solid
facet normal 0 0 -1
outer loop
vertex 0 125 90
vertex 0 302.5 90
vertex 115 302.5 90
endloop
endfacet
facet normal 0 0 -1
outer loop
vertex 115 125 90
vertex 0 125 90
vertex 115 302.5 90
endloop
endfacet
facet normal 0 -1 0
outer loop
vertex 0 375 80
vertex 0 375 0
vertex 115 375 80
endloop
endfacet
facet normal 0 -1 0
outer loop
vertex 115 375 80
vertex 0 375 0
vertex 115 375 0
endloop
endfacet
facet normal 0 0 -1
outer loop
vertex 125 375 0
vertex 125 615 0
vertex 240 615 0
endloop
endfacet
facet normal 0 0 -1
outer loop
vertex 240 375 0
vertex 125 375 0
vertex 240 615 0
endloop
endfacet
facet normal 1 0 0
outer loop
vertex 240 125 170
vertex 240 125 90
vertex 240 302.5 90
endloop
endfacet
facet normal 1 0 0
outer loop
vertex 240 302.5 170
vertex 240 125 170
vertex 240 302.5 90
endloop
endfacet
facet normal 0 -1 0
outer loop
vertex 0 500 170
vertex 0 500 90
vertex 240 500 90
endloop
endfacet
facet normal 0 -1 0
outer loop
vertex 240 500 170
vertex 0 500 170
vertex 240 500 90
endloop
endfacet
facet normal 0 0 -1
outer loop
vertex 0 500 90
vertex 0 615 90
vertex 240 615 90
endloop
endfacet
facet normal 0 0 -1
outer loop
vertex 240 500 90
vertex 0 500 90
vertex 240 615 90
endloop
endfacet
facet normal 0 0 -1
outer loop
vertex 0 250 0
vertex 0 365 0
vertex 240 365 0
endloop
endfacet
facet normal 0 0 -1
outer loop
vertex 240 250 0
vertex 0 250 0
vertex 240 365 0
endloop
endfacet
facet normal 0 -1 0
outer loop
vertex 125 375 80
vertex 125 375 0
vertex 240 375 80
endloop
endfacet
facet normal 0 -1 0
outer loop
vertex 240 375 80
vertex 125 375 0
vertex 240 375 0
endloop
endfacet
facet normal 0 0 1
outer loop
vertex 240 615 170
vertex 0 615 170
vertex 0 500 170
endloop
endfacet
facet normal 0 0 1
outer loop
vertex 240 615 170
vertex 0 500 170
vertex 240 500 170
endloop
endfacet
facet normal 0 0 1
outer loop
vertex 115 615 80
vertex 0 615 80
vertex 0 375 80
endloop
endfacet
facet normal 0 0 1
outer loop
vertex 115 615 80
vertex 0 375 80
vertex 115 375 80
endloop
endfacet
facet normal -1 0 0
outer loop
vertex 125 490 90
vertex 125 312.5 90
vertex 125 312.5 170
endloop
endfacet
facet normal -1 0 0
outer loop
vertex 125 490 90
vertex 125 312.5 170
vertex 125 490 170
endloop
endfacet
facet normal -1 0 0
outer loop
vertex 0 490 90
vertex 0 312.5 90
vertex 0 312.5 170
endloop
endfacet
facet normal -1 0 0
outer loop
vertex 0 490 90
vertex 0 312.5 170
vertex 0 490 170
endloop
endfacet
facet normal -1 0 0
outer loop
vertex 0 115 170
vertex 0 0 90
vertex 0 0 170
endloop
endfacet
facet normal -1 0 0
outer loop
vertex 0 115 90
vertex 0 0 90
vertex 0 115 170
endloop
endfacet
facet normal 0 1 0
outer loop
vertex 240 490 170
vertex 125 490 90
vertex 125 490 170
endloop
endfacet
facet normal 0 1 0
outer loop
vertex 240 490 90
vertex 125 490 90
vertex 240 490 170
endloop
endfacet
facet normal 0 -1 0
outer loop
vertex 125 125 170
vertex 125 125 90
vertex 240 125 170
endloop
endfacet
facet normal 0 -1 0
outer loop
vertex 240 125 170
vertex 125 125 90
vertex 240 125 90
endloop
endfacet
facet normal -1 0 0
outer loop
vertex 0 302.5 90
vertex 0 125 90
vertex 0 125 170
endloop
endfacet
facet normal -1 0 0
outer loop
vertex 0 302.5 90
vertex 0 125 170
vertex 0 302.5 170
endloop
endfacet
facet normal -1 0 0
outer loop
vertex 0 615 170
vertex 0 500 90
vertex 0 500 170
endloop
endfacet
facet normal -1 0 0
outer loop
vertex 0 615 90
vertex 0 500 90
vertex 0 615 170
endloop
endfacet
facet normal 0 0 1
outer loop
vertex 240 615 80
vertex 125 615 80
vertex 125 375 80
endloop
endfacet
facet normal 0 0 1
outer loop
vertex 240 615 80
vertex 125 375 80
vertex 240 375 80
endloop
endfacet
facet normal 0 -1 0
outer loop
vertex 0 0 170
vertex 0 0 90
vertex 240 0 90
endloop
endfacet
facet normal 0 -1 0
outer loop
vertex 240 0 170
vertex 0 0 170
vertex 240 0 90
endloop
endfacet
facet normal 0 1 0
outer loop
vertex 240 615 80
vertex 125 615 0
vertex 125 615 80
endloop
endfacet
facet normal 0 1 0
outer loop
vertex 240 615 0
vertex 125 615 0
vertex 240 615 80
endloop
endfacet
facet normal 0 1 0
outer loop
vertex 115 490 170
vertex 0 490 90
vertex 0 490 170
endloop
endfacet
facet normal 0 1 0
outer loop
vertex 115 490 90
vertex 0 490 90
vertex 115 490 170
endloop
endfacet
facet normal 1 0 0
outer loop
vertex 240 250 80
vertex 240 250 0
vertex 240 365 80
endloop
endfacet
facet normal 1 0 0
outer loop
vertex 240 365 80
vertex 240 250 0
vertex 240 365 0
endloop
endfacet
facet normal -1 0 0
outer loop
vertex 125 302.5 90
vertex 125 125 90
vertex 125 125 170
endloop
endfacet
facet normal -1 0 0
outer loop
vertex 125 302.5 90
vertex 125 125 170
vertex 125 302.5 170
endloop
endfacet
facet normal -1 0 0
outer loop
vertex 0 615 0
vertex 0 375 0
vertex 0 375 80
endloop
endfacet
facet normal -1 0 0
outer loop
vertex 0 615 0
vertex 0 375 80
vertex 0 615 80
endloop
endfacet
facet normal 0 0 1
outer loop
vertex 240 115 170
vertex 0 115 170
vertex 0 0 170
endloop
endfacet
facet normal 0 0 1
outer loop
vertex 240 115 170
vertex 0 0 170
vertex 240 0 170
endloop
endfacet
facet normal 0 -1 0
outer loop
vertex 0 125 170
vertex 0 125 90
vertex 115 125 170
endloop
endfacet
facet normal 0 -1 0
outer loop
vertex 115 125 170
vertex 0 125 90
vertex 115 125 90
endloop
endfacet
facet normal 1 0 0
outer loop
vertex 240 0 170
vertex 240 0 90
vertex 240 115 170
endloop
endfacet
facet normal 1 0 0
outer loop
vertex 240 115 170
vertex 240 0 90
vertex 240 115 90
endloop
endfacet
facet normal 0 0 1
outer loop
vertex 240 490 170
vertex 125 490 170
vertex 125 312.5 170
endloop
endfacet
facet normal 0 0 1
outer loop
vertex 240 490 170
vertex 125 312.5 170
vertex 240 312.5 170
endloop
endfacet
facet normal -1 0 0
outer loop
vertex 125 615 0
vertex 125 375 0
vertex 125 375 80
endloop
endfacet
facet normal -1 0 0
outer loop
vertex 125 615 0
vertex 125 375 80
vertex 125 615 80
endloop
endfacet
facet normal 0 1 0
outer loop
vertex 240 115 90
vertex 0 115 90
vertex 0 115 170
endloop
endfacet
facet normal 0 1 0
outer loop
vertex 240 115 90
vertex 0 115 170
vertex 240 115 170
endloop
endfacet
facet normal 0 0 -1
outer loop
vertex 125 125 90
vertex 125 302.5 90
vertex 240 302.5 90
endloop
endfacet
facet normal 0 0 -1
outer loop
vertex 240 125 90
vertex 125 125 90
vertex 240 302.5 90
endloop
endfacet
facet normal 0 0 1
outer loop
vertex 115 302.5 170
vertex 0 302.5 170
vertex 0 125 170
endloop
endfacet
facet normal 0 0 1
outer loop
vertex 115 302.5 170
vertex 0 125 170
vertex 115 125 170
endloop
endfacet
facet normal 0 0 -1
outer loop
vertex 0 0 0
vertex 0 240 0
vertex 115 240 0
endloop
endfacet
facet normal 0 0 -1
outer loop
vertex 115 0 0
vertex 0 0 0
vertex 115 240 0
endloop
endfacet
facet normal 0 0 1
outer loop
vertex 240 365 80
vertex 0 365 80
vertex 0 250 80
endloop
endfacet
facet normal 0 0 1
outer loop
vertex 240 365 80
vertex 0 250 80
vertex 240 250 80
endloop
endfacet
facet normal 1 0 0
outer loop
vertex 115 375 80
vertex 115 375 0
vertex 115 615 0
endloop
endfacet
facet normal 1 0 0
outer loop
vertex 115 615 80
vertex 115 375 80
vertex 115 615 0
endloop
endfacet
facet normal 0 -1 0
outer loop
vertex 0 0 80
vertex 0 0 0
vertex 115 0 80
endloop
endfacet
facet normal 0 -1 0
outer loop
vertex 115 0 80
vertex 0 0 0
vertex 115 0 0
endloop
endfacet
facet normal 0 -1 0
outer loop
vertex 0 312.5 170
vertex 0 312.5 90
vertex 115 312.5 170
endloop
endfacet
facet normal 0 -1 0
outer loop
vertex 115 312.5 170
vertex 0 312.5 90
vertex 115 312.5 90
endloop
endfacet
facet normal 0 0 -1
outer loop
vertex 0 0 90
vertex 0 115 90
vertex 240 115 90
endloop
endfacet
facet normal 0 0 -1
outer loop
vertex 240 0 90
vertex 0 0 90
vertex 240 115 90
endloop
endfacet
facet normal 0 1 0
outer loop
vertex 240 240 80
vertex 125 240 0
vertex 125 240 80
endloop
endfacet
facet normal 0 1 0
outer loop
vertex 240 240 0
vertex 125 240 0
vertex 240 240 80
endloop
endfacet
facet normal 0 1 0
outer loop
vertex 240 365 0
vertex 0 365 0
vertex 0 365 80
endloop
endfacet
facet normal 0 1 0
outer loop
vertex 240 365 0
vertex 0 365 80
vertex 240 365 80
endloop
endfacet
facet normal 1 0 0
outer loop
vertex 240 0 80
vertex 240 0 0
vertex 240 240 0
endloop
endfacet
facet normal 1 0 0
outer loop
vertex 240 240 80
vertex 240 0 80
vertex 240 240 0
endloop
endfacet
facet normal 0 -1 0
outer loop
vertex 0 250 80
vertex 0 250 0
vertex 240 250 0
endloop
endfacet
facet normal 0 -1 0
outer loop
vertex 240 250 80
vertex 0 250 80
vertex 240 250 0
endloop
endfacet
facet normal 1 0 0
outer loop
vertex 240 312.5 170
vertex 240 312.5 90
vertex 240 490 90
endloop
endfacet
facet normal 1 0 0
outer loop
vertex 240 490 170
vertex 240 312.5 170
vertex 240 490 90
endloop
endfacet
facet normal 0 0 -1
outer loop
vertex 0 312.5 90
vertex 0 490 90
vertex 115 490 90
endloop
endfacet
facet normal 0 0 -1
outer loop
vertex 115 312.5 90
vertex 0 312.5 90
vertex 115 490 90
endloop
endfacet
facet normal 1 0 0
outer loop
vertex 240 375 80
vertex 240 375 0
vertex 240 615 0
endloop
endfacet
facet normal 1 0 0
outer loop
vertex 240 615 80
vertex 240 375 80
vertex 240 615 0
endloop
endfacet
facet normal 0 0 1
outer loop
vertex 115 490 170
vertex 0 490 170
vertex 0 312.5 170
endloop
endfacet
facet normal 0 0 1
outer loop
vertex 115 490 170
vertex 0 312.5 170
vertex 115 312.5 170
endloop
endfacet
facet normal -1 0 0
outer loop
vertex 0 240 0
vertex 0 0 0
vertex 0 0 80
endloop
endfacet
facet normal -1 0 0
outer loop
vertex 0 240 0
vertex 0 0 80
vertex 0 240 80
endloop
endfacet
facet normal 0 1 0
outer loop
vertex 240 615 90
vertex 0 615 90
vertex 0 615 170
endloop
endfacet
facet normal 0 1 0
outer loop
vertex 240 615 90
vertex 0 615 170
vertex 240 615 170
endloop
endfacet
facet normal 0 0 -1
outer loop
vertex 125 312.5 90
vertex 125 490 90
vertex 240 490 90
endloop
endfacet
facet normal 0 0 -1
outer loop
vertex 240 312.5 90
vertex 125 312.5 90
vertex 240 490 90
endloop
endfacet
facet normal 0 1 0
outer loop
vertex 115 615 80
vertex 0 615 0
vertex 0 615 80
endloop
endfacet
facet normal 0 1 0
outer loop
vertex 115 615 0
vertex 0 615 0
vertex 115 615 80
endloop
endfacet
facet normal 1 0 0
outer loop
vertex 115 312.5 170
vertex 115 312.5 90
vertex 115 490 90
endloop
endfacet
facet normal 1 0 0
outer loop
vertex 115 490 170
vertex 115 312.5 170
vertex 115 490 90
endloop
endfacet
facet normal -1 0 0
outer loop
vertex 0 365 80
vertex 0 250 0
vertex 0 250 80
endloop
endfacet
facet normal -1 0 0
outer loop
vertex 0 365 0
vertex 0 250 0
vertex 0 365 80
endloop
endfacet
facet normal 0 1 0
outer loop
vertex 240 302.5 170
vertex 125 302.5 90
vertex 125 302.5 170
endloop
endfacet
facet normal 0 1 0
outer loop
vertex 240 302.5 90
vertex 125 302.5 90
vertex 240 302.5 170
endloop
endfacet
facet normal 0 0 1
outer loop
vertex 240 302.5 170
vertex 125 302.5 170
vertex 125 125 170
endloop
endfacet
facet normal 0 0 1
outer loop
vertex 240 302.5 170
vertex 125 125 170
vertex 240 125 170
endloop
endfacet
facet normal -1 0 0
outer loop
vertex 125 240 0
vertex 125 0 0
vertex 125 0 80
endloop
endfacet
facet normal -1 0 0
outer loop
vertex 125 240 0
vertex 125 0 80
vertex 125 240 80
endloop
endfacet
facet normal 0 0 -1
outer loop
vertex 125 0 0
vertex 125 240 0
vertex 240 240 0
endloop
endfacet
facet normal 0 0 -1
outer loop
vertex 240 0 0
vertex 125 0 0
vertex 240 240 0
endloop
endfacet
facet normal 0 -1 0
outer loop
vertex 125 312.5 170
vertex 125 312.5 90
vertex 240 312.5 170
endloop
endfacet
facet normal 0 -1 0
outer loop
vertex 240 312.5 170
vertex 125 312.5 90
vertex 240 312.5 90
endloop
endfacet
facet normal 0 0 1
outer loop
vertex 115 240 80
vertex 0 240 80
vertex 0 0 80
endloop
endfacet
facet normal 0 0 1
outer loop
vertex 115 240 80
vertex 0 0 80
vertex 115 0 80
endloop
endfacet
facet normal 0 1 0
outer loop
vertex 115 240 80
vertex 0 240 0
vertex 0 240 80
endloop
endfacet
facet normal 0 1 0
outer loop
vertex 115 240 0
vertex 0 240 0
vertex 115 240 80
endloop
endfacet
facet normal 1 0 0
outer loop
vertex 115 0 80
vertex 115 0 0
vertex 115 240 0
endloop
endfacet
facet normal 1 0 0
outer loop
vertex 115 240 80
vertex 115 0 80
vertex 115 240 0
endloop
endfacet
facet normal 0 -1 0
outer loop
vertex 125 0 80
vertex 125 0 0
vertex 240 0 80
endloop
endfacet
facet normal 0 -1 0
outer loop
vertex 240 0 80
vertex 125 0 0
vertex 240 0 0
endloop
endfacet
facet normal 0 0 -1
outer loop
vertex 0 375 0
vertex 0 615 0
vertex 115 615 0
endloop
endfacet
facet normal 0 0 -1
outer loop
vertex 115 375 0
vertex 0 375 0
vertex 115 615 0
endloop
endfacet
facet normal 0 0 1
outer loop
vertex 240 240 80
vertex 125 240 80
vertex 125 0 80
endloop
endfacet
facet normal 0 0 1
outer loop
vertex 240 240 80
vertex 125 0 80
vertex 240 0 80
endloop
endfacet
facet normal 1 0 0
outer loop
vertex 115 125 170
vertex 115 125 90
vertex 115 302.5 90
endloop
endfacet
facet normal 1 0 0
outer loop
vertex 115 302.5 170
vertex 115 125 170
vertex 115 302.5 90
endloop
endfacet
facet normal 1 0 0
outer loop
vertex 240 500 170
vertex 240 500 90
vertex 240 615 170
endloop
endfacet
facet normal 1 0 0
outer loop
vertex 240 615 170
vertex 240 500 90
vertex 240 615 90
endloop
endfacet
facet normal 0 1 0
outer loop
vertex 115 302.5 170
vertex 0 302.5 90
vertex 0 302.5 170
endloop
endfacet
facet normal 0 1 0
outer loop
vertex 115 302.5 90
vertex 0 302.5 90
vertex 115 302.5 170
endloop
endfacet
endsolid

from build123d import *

# Parameters (mm, degrees)
F0_W     = 115
F0_H     = 240
F1_DEPTH = 80
F0_W_2   = 240
F0_H_2   = 115
F3_W     = 240
F3_H     = 115
F4_DEPTH = 80
F3_W_2   = 115
F3_H_2   = 177.5


with BuildPart() as f1:
    # F0 (on Top) → F1 (new body)
    with BuildSketch(Plane.XY):
        with Locations((57.5, 120)):
            Rectangle(F0_W, F0_H)
    extrude(amount=F1_DEPTH)


with BuildPart() as f1b:
    # F0 (on Top) → F1, piece 2 (new body)
    with BuildSketch(Plane.XY):
        with Locations((182.5, 120)):
            Rectangle(F0_W, F0_H)
    extrude(amount=F1_DEPTH)


with BuildPart() as f1c:
    # F0 (on Top) → F1, piece 3 (new body)
    with BuildSketch(Plane.XY):
        with Locations((120, 307.5)):
            Rectangle(F0_W_2, F0_H_2)
    extrude(amount=F1_DEPTH)


with BuildPart() as f1d:
    # F0 (on Top) → F1, piece 4 (new body)
    with BuildSketch(Plane.XY):
        with Locations((57.5, 495)):
            Rectangle(F0_W, F0_H)
    extrude(amount=F1_DEPTH)


with BuildPart() as f1e:
    # F0 (on Top) → F1, piece 5 (new body)
    with BuildSketch(Plane.XY):
        with Locations((182.5, 495)):
            Rectangle(F0_W, F0_H)
    extrude(amount=F1_DEPTH)


with BuildPart() as f4:
    # F3 (on offset) → F4 (new body)
    with BuildSketch(Plane.XY.offset(90)):
        with Locations((120, 57.5)):
            Rectangle(F3_W, F3_H)
    extrude(amount=F4_DEPTH)


with BuildPart() as f4b:
    # F3 (on offset) → F4, piece 2 (new body)
    with BuildSketch(Plane.XY.offset(90)):
        with Locations((57.5, 213.75)):
            Rectangle(F3_W_2, F3_H_2)
    extrude(amount=F4_DEPTH)


with BuildPart() as f4c:
    # F3 (on offset) → F4, piece 3 (new body)
    with BuildSketch(Plane.XY.offset(90)):
        with Locations((182.5, 213.75)):
            Rectangle(F3_W_2, F3_H_2)
    extrude(amount=F4_DEPTH)


with BuildPart() as f4d:
    # F3 (on offset) → F4, piece 4 (new body)
    with BuildSketch(Plane.XY.offset(90)):
        with Locations((57.5, 401.25)):
            Rectangle(F3_W_2, F3_H_2)
    extrude(amount=F4_DEPTH)


with BuildPart() as f4e:
    # F3 (on offset) → F4, piece 5 (new body)
    with BuildSketch(Plane.XY.offset(90)):
        with Locations((182.5, 401.25)):
            Rectangle(F3_W_2, F3_H_2)
    extrude(amount=F4_DEPTH)


with BuildPart() as f4f:
    # F3 (on offset) → F4, piece 6 (new body)
    with BuildSketch(Plane.XY.offset(90)):
        with Locations((120, 557.5)):
            Rectangle(F3_W, F3_H)
    extrude(amount=F4_DEPTH)


solid = Compound([f1.part, f1b.part, f1c.part, f1d.part, f1e.part, f4.part, f4b.part, f4c.part, f4d.part, f4e.part, f4f.part])
